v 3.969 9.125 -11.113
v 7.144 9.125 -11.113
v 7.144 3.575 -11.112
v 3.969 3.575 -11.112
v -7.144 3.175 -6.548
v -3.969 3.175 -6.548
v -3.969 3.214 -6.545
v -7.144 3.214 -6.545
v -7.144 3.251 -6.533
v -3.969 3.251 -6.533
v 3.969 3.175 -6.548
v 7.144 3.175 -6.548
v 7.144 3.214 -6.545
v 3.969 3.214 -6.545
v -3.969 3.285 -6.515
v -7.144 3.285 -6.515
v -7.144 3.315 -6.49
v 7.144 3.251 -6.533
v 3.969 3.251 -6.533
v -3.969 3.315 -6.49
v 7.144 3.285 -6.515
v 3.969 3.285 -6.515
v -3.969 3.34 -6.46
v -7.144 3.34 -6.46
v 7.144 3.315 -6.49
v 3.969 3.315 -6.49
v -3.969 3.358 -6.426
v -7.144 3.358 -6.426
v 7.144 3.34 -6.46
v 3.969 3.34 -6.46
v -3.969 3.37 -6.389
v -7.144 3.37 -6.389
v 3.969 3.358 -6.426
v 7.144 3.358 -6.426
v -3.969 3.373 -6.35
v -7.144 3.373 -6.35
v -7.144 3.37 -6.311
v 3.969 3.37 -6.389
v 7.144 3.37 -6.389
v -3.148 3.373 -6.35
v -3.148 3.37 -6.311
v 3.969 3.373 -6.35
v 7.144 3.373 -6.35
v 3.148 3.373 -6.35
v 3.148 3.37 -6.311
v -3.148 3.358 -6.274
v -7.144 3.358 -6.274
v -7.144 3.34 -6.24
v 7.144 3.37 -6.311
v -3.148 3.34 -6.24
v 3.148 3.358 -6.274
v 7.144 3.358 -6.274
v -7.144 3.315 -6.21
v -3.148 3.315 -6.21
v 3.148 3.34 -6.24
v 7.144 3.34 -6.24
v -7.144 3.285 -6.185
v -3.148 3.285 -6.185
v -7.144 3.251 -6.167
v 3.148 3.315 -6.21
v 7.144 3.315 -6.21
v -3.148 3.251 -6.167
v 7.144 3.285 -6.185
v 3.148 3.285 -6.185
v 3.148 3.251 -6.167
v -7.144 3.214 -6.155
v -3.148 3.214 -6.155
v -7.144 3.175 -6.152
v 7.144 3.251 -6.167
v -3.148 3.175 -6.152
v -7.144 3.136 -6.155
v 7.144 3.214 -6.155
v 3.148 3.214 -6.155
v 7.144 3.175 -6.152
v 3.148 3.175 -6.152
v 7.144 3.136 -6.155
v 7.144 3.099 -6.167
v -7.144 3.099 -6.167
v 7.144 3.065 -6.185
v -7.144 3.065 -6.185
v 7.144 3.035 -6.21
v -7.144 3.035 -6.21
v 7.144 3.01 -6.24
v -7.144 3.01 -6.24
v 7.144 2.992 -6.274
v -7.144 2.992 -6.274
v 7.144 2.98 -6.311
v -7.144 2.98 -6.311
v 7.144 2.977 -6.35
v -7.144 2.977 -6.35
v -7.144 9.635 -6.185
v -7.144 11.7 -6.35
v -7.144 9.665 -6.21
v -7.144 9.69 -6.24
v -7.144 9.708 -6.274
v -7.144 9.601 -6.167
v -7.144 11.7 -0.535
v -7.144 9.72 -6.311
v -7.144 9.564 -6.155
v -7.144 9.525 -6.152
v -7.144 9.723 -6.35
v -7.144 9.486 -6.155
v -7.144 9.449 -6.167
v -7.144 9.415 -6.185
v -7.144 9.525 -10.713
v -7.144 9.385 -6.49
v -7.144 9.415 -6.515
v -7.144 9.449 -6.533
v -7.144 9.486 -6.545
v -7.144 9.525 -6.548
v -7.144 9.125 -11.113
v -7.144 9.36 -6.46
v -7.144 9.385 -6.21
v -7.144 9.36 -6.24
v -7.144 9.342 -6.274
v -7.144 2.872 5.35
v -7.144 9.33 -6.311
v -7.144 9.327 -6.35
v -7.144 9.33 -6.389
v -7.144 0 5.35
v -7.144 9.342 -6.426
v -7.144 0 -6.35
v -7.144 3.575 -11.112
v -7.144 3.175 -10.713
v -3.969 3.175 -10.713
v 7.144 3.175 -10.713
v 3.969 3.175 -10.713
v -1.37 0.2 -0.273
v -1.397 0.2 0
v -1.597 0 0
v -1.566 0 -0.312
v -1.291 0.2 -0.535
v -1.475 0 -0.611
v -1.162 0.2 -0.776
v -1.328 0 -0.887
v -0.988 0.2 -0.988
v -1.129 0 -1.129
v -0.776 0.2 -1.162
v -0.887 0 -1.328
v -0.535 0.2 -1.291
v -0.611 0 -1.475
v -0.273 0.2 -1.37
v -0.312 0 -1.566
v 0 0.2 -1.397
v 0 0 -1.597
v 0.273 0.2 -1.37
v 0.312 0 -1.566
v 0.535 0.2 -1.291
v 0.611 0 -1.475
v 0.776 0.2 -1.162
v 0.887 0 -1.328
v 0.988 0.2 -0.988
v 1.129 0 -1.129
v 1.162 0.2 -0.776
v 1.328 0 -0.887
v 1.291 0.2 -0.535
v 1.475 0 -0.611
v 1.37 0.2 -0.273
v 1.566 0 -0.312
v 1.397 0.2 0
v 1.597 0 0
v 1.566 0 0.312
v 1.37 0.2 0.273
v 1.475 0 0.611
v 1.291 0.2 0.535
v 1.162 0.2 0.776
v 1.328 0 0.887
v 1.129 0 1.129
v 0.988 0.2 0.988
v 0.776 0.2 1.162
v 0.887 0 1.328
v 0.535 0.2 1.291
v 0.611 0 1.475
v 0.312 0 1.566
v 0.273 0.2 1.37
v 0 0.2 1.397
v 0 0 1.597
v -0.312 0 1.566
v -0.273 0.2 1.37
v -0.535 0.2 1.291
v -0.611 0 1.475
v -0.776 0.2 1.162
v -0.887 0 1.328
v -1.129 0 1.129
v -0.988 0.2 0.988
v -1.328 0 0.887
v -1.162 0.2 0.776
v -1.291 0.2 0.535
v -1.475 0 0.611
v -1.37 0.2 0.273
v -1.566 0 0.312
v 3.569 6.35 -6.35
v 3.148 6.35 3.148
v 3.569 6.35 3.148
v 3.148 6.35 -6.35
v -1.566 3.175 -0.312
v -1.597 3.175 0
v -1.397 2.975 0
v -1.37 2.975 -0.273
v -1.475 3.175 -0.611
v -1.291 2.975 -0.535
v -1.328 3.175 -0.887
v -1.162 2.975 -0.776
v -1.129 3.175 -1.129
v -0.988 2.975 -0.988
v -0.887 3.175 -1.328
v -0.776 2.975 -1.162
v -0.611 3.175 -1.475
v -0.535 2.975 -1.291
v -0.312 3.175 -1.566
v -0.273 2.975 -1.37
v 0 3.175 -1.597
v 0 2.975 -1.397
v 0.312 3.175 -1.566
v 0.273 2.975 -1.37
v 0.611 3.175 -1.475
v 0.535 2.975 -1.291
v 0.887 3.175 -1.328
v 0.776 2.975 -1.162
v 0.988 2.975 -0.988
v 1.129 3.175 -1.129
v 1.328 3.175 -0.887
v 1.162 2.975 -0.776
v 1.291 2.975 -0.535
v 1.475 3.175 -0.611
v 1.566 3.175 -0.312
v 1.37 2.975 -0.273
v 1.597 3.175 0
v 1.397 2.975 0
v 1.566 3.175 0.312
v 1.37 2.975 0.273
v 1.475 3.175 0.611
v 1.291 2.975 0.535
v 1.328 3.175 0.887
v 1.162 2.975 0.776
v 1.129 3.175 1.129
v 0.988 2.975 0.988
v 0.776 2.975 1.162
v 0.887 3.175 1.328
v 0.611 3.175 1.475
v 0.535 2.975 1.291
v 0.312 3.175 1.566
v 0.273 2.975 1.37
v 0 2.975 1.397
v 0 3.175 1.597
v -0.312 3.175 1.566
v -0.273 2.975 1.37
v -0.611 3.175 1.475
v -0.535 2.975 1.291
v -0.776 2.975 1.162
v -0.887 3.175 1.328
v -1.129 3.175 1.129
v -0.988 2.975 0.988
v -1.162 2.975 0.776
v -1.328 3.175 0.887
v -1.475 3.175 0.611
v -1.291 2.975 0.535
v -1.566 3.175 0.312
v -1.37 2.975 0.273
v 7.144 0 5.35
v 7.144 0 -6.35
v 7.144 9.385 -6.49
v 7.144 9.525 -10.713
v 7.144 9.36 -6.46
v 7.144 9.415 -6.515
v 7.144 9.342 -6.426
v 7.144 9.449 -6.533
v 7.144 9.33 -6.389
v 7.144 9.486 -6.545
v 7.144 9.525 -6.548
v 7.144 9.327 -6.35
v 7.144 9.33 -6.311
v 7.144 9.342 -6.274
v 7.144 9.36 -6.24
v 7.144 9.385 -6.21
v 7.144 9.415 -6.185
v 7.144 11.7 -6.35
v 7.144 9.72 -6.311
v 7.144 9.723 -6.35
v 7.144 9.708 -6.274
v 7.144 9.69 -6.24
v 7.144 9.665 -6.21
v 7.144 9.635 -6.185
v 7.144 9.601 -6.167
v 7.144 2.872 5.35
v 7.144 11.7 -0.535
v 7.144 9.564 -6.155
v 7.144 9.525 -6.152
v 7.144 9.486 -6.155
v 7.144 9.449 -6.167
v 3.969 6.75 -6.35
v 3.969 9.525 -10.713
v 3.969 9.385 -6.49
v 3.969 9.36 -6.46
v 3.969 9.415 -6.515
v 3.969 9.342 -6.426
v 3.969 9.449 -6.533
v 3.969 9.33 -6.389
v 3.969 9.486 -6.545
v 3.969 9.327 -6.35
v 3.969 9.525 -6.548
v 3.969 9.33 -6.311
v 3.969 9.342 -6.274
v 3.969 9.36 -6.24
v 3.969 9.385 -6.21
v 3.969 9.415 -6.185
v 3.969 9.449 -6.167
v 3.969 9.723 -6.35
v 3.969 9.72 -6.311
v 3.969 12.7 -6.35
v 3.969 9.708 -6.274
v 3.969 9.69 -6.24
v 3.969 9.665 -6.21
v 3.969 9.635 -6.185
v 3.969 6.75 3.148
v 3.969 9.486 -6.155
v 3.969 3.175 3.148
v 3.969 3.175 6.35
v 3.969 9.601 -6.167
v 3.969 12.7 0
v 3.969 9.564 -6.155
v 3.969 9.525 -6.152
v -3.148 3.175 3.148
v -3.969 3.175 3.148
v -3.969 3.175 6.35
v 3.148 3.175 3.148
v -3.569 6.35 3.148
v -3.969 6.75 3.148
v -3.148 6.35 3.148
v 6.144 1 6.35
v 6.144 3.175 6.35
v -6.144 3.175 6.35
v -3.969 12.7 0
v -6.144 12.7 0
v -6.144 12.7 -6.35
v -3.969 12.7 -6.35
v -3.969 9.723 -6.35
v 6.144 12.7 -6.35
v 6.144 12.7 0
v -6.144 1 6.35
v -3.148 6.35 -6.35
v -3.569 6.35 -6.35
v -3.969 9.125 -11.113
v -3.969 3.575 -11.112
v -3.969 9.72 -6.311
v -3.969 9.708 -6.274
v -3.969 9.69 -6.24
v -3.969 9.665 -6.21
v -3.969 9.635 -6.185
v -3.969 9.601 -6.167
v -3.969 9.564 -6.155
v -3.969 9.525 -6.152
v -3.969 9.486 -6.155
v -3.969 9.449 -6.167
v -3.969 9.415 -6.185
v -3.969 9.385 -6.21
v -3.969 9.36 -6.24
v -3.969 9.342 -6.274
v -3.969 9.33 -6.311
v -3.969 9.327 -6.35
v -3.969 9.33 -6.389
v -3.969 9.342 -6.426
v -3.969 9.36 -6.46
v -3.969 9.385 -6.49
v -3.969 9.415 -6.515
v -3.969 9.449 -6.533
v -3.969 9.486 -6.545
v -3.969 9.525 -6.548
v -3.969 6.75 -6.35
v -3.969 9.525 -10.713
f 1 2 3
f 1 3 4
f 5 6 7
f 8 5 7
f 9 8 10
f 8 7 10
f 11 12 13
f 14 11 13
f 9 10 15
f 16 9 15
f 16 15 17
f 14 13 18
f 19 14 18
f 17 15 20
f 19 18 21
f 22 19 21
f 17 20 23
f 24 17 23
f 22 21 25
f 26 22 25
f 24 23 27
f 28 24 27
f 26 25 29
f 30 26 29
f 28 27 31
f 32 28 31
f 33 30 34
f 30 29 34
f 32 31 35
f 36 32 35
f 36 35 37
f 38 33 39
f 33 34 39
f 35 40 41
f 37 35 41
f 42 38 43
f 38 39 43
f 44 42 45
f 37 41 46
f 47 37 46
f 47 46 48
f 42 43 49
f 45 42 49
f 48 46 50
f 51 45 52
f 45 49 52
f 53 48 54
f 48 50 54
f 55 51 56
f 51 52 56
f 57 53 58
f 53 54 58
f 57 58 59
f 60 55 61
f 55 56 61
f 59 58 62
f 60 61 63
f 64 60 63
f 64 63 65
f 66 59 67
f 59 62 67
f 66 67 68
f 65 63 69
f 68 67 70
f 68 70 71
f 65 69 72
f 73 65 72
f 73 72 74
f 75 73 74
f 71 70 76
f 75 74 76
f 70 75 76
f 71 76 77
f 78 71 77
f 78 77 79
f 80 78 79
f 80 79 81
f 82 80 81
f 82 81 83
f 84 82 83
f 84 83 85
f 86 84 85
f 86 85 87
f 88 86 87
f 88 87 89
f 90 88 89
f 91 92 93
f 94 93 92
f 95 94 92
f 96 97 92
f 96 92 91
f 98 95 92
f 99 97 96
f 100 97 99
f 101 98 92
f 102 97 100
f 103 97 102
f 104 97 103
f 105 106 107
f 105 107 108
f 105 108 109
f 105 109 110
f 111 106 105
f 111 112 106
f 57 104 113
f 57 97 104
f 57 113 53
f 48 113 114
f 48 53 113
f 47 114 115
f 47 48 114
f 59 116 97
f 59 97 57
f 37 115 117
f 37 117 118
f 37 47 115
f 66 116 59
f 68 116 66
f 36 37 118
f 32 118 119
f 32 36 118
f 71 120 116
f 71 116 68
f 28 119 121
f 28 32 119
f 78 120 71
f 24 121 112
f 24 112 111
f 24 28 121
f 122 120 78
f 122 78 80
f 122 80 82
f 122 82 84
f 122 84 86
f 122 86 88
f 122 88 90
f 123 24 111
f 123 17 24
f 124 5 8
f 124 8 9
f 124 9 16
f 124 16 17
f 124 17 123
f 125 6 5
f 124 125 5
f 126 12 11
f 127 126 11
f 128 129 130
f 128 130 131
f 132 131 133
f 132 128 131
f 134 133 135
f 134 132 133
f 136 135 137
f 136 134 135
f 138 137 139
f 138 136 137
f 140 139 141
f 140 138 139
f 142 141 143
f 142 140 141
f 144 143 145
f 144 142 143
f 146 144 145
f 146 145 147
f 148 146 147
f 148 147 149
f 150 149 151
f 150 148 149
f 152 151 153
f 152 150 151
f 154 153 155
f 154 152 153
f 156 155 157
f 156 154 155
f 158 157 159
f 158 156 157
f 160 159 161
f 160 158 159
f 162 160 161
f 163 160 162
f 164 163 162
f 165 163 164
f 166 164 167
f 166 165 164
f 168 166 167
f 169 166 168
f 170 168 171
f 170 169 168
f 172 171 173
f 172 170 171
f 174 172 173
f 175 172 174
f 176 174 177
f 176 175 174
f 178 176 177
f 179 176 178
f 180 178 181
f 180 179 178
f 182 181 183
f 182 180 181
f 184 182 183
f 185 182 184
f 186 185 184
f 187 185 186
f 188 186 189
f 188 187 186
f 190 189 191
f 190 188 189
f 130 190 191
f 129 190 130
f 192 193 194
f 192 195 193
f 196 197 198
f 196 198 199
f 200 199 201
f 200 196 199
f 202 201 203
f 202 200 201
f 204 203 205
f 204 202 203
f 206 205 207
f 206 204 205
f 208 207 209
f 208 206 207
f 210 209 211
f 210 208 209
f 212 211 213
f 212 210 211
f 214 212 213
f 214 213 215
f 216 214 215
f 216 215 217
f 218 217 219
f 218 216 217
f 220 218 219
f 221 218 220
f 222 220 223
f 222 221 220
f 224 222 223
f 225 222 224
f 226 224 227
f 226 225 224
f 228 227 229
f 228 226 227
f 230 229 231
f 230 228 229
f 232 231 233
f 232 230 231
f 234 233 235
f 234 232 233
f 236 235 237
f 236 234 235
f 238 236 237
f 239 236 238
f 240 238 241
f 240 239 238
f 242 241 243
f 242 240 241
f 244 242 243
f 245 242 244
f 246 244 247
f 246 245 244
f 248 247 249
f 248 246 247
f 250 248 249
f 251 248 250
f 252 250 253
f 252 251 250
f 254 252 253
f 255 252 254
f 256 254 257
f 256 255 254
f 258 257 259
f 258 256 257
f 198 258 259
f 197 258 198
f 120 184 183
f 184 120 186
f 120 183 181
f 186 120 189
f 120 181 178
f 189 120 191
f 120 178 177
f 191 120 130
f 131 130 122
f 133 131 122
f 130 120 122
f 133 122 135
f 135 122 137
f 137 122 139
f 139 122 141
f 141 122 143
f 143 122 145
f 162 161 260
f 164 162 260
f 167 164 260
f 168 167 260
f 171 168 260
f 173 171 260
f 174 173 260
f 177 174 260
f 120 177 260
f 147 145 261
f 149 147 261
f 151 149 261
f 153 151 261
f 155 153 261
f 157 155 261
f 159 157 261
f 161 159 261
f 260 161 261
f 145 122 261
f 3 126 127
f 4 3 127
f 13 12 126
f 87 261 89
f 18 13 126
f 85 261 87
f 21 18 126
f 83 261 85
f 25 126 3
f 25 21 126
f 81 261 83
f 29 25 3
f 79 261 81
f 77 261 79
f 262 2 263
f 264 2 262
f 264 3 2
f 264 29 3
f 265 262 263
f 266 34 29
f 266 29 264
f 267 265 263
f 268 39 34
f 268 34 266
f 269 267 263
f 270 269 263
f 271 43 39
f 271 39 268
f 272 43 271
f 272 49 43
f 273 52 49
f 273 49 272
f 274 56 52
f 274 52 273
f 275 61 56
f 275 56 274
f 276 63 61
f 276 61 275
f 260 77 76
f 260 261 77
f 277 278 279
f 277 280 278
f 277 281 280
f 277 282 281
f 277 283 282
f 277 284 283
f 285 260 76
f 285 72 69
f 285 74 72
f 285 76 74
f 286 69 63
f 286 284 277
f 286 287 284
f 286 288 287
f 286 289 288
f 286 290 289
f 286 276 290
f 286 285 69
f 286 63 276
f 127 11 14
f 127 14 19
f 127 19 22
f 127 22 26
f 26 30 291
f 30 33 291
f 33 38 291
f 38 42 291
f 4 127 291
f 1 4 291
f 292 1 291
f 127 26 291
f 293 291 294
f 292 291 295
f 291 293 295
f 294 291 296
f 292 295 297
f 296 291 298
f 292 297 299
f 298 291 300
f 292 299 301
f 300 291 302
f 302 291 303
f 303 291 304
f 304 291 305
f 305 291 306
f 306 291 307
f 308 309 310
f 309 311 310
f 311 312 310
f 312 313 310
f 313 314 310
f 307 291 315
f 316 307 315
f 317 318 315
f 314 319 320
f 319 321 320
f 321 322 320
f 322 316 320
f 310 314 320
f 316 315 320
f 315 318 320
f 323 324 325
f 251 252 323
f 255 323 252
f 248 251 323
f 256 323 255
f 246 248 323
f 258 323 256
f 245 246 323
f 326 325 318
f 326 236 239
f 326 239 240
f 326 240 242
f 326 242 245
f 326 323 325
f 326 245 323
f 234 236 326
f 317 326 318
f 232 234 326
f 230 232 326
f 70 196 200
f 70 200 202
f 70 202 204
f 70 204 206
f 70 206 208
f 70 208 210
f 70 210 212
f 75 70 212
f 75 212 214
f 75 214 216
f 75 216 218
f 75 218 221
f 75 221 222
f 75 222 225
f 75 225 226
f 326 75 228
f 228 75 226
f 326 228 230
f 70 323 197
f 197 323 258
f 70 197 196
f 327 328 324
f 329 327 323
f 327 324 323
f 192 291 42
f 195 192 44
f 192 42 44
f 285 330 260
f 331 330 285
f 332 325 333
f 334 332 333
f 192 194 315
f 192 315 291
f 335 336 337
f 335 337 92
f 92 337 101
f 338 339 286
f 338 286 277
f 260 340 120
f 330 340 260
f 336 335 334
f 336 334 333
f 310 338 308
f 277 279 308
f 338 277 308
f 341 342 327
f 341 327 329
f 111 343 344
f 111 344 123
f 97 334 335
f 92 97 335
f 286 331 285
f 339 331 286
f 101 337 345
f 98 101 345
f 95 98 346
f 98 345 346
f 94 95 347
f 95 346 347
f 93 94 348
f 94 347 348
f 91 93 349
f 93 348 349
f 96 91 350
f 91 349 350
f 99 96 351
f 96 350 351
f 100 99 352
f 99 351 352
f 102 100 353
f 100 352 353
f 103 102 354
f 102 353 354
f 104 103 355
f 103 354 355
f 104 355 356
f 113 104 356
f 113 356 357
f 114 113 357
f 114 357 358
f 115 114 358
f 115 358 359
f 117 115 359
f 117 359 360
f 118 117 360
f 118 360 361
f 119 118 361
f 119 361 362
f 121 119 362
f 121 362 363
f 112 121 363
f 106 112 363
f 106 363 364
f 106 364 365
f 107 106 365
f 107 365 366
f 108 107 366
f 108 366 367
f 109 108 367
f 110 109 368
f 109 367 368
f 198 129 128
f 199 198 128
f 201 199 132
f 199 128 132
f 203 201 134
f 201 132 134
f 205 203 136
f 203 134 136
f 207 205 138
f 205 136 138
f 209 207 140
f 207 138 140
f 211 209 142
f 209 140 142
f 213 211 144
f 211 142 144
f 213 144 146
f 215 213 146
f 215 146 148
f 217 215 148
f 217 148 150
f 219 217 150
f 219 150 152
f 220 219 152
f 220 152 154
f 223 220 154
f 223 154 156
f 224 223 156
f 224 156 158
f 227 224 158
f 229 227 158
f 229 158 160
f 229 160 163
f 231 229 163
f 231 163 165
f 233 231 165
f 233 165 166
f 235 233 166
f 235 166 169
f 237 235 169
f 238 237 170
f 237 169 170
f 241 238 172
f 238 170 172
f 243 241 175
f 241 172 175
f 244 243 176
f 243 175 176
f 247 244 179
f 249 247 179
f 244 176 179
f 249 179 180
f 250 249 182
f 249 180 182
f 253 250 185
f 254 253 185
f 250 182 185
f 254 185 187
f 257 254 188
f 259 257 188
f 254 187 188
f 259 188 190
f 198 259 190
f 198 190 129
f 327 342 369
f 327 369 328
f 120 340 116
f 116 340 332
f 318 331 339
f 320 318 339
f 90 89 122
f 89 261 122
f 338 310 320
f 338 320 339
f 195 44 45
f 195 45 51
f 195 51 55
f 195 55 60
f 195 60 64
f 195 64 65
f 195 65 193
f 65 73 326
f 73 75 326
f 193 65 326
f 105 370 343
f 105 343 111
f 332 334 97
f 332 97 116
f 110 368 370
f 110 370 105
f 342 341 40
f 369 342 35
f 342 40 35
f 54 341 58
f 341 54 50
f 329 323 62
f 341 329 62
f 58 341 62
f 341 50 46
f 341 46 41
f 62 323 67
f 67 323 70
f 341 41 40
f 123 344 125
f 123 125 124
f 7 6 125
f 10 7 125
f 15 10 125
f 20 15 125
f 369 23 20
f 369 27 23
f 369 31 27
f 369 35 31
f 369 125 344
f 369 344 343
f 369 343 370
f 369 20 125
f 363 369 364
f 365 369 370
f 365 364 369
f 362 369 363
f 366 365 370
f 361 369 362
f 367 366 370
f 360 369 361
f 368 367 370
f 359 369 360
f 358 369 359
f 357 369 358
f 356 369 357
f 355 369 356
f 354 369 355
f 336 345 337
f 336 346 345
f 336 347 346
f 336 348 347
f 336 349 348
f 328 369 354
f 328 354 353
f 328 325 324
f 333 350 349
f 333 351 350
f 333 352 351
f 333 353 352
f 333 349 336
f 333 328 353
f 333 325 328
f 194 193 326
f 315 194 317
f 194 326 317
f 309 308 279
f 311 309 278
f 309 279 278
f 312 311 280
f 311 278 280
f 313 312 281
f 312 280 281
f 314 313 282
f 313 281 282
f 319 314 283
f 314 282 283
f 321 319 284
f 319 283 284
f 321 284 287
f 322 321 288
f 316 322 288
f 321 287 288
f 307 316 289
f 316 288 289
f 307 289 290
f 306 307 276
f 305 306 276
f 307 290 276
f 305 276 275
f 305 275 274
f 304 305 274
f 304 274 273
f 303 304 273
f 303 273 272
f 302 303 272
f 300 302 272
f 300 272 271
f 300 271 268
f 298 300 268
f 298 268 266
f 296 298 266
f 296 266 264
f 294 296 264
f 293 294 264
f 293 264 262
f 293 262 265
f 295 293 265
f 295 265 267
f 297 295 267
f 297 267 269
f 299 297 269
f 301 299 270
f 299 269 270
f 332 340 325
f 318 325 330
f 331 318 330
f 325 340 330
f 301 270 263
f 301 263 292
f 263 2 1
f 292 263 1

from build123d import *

# Parameters (mm, degrees)
SKETCH1_W                  = 7.9375
SKETCH1_H                  = 12.7
BOSS_EXTRUDE1_DEPTH        = 3.175
SKETCH1_3_W                = 3.175
SKETCH1_3_H                = 12.7
BOSS_EXTRUDE2_DEPTH        = 12.7
CUT_EXTRUDE2_DEPTH         = 21.143116845
BOSS_EXTRUDE3_DEPTH        = 3.175
SKETCH4_W                  = 3.175
SKETCH4_H                  = 6.35
BOSS_EXTRUDE4_DEPTH        = 4.7625
SKETCH5_R                  = 0.1984375
CUT_EXTRUDE3_DEPTH         = 23.11131639
CHAMFER1_SIZE              = 0.4
CHAMFER2_SIZE              = 1
F_35_0_11_DIAMETER_HOLE1_D = 2.794
CHAMFER3_SIZE              = 0.2


with BuildPart() as part:
    # Sketch1 → Boss-Extrude1 (new body)
    with BuildSketch(Plane(origin=(0, 0, 0), x_dir=(1, 0, 0), z_dir=(0, 1, 0))):
        Rectangle(SKETCH1_W, SKETCH1_H)
    extrude(amount=BOSS_EXTRUDE1_DEPTH)

    # Sketch1<3> → Boss-Extrude2 (add)
    with BuildSketch(Plane(origin=(0, 0, 0), x_dir=(1, 0, 0), z_dir=(0, 1, 0))):
        with Locations((5.55625, 0)):
            Rectangle(SKETCH1_3_W, SKETCH1_3_H)
        with Locations((-5.55625, 0)):
            Rectangle(SKETCH1_3_W, SKETCH1_3_H)
    extrude(amount=BOSS_EXTRUDE2_DEPTH)

    # Sketch2 → Cut-Extrude2 (cut, through all)
    with BuildSketch(Plane(origin=(7.14375, 0, 0), x_dir=(0, 0, -1), z_dir=(1, 0, 0))):
        Polygon((-6.35, 3.175), (0, 12.7), (-6.35, 12.7), align=None)
    extrude(amount=-CUT_EXTRUDE2_DEPTH, mode=Mode.SUBTRACT)

    # Sketch3 → Boss-Extrude3 (add)
    with BuildSketch(Plane(origin=(0, 3.175, 0), x_dir=(1, 0, 0), z_dir=(0, 1, 0))):
        Polygon((-3.148, 3.148), (-3.148, 6.35), (-3.96875, 6.35), (-3.96875, -3.148), (-3.148, -3.148), align=None)
        Polygon((3.148, 3.148), (3.148, -3.148), (3.96875, -3.148), (3.96875, 6.35), (3.148, 6.35), align=None)
    extrude(amount=BOSS_EXTRUDE3_DEPTH)

    # Sketch4 → Boss-Extrude4 (add)
    with BuildSketch(Plane(origin=(0, 0, -6.35), x_dir=(-1, 0, 0), z_dir=(0, 0, -1))):
        with Locations((-5.55625, 6.35)):
            Rectangle(SKETCH4_W, SKETCH4_H)
        with Locations((5.55625, 6.35)):
            Rectangle(SKETCH4_W, SKETCH4_H)
    extrude(amount=BOSS_EXTRUDE4_DEPTH)

    # Sketch5 → Cut-Extrude3 (cut, through all)
    with BuildSketch(Plane(origin=(7.14375, 0, 0), x_dir=(0, 0, -1), z_dir=(1, 0, 0))):
        with Locations((6.35, 9.525)):
            Circle(SKETCH5_R)
        with Locations((6.35, 3.175)):
            Circle(SKETCH5_R)
    extrude(amount=-CUT_EXTRUDE3_DEPTH, mode=Mode.SUBTRACT)

    # Chamfer1
    chamfer1_edges = [part.edges().sort_by_distance(p)[0] for p in [
        (-5.55625, 9.525, -11.1125),
        (-5.55625, 3.175, -11.1125),
        (5.55625, 3.175, -11.1125),
        (5.55625, 9.525, -11.1125),
        (3.96875, 6.35, -1.601),
        (-3.96875, 6.35, -1.601),
    ]]
    chamfer(chamfer1_edges, length=CHAMFER1_SIZE)

    # Chamfer2
    chamfer2_edges = [part.edges().sort_by_distance(p)[0] for p in [
        (-7.14375, 12.7, -3.175),
        (7.14375, 12.7, -3.175),
        (7.14375, 7.9375, 3.175),
        (-7.14375, 7.9375, 3.175),
        (-7.14375, 1.5875, 6.35),
        (7.14375, 1.5875, 6.35),
        (0, 0, 6.35),
    ]]
    chamfer(chamfer2_edges, length=CHAMFER2_SIZE)

    # #35 (0.11) Diameter Hole1 (through all)
    with Locations(Plane(origin=(0, 3.175, 0), x_dir=(1, 0, 0), z_dir=(0, 1, 0))):
        with Locations((0, 0)):
            Hole(F_35_0_11_DIAMETER_HOLE1_D / 2)

    # Chamfer3
    chamfer3_edges = [part.edges().sort_by_distance(p)[0] for p in [
        (1.397, 3.175, 0),
        (1.397, 0, 0),
    ]]
    chamfer(chamfer3_edges, length=CHAMFER3_SIZE)


solid = part.part
